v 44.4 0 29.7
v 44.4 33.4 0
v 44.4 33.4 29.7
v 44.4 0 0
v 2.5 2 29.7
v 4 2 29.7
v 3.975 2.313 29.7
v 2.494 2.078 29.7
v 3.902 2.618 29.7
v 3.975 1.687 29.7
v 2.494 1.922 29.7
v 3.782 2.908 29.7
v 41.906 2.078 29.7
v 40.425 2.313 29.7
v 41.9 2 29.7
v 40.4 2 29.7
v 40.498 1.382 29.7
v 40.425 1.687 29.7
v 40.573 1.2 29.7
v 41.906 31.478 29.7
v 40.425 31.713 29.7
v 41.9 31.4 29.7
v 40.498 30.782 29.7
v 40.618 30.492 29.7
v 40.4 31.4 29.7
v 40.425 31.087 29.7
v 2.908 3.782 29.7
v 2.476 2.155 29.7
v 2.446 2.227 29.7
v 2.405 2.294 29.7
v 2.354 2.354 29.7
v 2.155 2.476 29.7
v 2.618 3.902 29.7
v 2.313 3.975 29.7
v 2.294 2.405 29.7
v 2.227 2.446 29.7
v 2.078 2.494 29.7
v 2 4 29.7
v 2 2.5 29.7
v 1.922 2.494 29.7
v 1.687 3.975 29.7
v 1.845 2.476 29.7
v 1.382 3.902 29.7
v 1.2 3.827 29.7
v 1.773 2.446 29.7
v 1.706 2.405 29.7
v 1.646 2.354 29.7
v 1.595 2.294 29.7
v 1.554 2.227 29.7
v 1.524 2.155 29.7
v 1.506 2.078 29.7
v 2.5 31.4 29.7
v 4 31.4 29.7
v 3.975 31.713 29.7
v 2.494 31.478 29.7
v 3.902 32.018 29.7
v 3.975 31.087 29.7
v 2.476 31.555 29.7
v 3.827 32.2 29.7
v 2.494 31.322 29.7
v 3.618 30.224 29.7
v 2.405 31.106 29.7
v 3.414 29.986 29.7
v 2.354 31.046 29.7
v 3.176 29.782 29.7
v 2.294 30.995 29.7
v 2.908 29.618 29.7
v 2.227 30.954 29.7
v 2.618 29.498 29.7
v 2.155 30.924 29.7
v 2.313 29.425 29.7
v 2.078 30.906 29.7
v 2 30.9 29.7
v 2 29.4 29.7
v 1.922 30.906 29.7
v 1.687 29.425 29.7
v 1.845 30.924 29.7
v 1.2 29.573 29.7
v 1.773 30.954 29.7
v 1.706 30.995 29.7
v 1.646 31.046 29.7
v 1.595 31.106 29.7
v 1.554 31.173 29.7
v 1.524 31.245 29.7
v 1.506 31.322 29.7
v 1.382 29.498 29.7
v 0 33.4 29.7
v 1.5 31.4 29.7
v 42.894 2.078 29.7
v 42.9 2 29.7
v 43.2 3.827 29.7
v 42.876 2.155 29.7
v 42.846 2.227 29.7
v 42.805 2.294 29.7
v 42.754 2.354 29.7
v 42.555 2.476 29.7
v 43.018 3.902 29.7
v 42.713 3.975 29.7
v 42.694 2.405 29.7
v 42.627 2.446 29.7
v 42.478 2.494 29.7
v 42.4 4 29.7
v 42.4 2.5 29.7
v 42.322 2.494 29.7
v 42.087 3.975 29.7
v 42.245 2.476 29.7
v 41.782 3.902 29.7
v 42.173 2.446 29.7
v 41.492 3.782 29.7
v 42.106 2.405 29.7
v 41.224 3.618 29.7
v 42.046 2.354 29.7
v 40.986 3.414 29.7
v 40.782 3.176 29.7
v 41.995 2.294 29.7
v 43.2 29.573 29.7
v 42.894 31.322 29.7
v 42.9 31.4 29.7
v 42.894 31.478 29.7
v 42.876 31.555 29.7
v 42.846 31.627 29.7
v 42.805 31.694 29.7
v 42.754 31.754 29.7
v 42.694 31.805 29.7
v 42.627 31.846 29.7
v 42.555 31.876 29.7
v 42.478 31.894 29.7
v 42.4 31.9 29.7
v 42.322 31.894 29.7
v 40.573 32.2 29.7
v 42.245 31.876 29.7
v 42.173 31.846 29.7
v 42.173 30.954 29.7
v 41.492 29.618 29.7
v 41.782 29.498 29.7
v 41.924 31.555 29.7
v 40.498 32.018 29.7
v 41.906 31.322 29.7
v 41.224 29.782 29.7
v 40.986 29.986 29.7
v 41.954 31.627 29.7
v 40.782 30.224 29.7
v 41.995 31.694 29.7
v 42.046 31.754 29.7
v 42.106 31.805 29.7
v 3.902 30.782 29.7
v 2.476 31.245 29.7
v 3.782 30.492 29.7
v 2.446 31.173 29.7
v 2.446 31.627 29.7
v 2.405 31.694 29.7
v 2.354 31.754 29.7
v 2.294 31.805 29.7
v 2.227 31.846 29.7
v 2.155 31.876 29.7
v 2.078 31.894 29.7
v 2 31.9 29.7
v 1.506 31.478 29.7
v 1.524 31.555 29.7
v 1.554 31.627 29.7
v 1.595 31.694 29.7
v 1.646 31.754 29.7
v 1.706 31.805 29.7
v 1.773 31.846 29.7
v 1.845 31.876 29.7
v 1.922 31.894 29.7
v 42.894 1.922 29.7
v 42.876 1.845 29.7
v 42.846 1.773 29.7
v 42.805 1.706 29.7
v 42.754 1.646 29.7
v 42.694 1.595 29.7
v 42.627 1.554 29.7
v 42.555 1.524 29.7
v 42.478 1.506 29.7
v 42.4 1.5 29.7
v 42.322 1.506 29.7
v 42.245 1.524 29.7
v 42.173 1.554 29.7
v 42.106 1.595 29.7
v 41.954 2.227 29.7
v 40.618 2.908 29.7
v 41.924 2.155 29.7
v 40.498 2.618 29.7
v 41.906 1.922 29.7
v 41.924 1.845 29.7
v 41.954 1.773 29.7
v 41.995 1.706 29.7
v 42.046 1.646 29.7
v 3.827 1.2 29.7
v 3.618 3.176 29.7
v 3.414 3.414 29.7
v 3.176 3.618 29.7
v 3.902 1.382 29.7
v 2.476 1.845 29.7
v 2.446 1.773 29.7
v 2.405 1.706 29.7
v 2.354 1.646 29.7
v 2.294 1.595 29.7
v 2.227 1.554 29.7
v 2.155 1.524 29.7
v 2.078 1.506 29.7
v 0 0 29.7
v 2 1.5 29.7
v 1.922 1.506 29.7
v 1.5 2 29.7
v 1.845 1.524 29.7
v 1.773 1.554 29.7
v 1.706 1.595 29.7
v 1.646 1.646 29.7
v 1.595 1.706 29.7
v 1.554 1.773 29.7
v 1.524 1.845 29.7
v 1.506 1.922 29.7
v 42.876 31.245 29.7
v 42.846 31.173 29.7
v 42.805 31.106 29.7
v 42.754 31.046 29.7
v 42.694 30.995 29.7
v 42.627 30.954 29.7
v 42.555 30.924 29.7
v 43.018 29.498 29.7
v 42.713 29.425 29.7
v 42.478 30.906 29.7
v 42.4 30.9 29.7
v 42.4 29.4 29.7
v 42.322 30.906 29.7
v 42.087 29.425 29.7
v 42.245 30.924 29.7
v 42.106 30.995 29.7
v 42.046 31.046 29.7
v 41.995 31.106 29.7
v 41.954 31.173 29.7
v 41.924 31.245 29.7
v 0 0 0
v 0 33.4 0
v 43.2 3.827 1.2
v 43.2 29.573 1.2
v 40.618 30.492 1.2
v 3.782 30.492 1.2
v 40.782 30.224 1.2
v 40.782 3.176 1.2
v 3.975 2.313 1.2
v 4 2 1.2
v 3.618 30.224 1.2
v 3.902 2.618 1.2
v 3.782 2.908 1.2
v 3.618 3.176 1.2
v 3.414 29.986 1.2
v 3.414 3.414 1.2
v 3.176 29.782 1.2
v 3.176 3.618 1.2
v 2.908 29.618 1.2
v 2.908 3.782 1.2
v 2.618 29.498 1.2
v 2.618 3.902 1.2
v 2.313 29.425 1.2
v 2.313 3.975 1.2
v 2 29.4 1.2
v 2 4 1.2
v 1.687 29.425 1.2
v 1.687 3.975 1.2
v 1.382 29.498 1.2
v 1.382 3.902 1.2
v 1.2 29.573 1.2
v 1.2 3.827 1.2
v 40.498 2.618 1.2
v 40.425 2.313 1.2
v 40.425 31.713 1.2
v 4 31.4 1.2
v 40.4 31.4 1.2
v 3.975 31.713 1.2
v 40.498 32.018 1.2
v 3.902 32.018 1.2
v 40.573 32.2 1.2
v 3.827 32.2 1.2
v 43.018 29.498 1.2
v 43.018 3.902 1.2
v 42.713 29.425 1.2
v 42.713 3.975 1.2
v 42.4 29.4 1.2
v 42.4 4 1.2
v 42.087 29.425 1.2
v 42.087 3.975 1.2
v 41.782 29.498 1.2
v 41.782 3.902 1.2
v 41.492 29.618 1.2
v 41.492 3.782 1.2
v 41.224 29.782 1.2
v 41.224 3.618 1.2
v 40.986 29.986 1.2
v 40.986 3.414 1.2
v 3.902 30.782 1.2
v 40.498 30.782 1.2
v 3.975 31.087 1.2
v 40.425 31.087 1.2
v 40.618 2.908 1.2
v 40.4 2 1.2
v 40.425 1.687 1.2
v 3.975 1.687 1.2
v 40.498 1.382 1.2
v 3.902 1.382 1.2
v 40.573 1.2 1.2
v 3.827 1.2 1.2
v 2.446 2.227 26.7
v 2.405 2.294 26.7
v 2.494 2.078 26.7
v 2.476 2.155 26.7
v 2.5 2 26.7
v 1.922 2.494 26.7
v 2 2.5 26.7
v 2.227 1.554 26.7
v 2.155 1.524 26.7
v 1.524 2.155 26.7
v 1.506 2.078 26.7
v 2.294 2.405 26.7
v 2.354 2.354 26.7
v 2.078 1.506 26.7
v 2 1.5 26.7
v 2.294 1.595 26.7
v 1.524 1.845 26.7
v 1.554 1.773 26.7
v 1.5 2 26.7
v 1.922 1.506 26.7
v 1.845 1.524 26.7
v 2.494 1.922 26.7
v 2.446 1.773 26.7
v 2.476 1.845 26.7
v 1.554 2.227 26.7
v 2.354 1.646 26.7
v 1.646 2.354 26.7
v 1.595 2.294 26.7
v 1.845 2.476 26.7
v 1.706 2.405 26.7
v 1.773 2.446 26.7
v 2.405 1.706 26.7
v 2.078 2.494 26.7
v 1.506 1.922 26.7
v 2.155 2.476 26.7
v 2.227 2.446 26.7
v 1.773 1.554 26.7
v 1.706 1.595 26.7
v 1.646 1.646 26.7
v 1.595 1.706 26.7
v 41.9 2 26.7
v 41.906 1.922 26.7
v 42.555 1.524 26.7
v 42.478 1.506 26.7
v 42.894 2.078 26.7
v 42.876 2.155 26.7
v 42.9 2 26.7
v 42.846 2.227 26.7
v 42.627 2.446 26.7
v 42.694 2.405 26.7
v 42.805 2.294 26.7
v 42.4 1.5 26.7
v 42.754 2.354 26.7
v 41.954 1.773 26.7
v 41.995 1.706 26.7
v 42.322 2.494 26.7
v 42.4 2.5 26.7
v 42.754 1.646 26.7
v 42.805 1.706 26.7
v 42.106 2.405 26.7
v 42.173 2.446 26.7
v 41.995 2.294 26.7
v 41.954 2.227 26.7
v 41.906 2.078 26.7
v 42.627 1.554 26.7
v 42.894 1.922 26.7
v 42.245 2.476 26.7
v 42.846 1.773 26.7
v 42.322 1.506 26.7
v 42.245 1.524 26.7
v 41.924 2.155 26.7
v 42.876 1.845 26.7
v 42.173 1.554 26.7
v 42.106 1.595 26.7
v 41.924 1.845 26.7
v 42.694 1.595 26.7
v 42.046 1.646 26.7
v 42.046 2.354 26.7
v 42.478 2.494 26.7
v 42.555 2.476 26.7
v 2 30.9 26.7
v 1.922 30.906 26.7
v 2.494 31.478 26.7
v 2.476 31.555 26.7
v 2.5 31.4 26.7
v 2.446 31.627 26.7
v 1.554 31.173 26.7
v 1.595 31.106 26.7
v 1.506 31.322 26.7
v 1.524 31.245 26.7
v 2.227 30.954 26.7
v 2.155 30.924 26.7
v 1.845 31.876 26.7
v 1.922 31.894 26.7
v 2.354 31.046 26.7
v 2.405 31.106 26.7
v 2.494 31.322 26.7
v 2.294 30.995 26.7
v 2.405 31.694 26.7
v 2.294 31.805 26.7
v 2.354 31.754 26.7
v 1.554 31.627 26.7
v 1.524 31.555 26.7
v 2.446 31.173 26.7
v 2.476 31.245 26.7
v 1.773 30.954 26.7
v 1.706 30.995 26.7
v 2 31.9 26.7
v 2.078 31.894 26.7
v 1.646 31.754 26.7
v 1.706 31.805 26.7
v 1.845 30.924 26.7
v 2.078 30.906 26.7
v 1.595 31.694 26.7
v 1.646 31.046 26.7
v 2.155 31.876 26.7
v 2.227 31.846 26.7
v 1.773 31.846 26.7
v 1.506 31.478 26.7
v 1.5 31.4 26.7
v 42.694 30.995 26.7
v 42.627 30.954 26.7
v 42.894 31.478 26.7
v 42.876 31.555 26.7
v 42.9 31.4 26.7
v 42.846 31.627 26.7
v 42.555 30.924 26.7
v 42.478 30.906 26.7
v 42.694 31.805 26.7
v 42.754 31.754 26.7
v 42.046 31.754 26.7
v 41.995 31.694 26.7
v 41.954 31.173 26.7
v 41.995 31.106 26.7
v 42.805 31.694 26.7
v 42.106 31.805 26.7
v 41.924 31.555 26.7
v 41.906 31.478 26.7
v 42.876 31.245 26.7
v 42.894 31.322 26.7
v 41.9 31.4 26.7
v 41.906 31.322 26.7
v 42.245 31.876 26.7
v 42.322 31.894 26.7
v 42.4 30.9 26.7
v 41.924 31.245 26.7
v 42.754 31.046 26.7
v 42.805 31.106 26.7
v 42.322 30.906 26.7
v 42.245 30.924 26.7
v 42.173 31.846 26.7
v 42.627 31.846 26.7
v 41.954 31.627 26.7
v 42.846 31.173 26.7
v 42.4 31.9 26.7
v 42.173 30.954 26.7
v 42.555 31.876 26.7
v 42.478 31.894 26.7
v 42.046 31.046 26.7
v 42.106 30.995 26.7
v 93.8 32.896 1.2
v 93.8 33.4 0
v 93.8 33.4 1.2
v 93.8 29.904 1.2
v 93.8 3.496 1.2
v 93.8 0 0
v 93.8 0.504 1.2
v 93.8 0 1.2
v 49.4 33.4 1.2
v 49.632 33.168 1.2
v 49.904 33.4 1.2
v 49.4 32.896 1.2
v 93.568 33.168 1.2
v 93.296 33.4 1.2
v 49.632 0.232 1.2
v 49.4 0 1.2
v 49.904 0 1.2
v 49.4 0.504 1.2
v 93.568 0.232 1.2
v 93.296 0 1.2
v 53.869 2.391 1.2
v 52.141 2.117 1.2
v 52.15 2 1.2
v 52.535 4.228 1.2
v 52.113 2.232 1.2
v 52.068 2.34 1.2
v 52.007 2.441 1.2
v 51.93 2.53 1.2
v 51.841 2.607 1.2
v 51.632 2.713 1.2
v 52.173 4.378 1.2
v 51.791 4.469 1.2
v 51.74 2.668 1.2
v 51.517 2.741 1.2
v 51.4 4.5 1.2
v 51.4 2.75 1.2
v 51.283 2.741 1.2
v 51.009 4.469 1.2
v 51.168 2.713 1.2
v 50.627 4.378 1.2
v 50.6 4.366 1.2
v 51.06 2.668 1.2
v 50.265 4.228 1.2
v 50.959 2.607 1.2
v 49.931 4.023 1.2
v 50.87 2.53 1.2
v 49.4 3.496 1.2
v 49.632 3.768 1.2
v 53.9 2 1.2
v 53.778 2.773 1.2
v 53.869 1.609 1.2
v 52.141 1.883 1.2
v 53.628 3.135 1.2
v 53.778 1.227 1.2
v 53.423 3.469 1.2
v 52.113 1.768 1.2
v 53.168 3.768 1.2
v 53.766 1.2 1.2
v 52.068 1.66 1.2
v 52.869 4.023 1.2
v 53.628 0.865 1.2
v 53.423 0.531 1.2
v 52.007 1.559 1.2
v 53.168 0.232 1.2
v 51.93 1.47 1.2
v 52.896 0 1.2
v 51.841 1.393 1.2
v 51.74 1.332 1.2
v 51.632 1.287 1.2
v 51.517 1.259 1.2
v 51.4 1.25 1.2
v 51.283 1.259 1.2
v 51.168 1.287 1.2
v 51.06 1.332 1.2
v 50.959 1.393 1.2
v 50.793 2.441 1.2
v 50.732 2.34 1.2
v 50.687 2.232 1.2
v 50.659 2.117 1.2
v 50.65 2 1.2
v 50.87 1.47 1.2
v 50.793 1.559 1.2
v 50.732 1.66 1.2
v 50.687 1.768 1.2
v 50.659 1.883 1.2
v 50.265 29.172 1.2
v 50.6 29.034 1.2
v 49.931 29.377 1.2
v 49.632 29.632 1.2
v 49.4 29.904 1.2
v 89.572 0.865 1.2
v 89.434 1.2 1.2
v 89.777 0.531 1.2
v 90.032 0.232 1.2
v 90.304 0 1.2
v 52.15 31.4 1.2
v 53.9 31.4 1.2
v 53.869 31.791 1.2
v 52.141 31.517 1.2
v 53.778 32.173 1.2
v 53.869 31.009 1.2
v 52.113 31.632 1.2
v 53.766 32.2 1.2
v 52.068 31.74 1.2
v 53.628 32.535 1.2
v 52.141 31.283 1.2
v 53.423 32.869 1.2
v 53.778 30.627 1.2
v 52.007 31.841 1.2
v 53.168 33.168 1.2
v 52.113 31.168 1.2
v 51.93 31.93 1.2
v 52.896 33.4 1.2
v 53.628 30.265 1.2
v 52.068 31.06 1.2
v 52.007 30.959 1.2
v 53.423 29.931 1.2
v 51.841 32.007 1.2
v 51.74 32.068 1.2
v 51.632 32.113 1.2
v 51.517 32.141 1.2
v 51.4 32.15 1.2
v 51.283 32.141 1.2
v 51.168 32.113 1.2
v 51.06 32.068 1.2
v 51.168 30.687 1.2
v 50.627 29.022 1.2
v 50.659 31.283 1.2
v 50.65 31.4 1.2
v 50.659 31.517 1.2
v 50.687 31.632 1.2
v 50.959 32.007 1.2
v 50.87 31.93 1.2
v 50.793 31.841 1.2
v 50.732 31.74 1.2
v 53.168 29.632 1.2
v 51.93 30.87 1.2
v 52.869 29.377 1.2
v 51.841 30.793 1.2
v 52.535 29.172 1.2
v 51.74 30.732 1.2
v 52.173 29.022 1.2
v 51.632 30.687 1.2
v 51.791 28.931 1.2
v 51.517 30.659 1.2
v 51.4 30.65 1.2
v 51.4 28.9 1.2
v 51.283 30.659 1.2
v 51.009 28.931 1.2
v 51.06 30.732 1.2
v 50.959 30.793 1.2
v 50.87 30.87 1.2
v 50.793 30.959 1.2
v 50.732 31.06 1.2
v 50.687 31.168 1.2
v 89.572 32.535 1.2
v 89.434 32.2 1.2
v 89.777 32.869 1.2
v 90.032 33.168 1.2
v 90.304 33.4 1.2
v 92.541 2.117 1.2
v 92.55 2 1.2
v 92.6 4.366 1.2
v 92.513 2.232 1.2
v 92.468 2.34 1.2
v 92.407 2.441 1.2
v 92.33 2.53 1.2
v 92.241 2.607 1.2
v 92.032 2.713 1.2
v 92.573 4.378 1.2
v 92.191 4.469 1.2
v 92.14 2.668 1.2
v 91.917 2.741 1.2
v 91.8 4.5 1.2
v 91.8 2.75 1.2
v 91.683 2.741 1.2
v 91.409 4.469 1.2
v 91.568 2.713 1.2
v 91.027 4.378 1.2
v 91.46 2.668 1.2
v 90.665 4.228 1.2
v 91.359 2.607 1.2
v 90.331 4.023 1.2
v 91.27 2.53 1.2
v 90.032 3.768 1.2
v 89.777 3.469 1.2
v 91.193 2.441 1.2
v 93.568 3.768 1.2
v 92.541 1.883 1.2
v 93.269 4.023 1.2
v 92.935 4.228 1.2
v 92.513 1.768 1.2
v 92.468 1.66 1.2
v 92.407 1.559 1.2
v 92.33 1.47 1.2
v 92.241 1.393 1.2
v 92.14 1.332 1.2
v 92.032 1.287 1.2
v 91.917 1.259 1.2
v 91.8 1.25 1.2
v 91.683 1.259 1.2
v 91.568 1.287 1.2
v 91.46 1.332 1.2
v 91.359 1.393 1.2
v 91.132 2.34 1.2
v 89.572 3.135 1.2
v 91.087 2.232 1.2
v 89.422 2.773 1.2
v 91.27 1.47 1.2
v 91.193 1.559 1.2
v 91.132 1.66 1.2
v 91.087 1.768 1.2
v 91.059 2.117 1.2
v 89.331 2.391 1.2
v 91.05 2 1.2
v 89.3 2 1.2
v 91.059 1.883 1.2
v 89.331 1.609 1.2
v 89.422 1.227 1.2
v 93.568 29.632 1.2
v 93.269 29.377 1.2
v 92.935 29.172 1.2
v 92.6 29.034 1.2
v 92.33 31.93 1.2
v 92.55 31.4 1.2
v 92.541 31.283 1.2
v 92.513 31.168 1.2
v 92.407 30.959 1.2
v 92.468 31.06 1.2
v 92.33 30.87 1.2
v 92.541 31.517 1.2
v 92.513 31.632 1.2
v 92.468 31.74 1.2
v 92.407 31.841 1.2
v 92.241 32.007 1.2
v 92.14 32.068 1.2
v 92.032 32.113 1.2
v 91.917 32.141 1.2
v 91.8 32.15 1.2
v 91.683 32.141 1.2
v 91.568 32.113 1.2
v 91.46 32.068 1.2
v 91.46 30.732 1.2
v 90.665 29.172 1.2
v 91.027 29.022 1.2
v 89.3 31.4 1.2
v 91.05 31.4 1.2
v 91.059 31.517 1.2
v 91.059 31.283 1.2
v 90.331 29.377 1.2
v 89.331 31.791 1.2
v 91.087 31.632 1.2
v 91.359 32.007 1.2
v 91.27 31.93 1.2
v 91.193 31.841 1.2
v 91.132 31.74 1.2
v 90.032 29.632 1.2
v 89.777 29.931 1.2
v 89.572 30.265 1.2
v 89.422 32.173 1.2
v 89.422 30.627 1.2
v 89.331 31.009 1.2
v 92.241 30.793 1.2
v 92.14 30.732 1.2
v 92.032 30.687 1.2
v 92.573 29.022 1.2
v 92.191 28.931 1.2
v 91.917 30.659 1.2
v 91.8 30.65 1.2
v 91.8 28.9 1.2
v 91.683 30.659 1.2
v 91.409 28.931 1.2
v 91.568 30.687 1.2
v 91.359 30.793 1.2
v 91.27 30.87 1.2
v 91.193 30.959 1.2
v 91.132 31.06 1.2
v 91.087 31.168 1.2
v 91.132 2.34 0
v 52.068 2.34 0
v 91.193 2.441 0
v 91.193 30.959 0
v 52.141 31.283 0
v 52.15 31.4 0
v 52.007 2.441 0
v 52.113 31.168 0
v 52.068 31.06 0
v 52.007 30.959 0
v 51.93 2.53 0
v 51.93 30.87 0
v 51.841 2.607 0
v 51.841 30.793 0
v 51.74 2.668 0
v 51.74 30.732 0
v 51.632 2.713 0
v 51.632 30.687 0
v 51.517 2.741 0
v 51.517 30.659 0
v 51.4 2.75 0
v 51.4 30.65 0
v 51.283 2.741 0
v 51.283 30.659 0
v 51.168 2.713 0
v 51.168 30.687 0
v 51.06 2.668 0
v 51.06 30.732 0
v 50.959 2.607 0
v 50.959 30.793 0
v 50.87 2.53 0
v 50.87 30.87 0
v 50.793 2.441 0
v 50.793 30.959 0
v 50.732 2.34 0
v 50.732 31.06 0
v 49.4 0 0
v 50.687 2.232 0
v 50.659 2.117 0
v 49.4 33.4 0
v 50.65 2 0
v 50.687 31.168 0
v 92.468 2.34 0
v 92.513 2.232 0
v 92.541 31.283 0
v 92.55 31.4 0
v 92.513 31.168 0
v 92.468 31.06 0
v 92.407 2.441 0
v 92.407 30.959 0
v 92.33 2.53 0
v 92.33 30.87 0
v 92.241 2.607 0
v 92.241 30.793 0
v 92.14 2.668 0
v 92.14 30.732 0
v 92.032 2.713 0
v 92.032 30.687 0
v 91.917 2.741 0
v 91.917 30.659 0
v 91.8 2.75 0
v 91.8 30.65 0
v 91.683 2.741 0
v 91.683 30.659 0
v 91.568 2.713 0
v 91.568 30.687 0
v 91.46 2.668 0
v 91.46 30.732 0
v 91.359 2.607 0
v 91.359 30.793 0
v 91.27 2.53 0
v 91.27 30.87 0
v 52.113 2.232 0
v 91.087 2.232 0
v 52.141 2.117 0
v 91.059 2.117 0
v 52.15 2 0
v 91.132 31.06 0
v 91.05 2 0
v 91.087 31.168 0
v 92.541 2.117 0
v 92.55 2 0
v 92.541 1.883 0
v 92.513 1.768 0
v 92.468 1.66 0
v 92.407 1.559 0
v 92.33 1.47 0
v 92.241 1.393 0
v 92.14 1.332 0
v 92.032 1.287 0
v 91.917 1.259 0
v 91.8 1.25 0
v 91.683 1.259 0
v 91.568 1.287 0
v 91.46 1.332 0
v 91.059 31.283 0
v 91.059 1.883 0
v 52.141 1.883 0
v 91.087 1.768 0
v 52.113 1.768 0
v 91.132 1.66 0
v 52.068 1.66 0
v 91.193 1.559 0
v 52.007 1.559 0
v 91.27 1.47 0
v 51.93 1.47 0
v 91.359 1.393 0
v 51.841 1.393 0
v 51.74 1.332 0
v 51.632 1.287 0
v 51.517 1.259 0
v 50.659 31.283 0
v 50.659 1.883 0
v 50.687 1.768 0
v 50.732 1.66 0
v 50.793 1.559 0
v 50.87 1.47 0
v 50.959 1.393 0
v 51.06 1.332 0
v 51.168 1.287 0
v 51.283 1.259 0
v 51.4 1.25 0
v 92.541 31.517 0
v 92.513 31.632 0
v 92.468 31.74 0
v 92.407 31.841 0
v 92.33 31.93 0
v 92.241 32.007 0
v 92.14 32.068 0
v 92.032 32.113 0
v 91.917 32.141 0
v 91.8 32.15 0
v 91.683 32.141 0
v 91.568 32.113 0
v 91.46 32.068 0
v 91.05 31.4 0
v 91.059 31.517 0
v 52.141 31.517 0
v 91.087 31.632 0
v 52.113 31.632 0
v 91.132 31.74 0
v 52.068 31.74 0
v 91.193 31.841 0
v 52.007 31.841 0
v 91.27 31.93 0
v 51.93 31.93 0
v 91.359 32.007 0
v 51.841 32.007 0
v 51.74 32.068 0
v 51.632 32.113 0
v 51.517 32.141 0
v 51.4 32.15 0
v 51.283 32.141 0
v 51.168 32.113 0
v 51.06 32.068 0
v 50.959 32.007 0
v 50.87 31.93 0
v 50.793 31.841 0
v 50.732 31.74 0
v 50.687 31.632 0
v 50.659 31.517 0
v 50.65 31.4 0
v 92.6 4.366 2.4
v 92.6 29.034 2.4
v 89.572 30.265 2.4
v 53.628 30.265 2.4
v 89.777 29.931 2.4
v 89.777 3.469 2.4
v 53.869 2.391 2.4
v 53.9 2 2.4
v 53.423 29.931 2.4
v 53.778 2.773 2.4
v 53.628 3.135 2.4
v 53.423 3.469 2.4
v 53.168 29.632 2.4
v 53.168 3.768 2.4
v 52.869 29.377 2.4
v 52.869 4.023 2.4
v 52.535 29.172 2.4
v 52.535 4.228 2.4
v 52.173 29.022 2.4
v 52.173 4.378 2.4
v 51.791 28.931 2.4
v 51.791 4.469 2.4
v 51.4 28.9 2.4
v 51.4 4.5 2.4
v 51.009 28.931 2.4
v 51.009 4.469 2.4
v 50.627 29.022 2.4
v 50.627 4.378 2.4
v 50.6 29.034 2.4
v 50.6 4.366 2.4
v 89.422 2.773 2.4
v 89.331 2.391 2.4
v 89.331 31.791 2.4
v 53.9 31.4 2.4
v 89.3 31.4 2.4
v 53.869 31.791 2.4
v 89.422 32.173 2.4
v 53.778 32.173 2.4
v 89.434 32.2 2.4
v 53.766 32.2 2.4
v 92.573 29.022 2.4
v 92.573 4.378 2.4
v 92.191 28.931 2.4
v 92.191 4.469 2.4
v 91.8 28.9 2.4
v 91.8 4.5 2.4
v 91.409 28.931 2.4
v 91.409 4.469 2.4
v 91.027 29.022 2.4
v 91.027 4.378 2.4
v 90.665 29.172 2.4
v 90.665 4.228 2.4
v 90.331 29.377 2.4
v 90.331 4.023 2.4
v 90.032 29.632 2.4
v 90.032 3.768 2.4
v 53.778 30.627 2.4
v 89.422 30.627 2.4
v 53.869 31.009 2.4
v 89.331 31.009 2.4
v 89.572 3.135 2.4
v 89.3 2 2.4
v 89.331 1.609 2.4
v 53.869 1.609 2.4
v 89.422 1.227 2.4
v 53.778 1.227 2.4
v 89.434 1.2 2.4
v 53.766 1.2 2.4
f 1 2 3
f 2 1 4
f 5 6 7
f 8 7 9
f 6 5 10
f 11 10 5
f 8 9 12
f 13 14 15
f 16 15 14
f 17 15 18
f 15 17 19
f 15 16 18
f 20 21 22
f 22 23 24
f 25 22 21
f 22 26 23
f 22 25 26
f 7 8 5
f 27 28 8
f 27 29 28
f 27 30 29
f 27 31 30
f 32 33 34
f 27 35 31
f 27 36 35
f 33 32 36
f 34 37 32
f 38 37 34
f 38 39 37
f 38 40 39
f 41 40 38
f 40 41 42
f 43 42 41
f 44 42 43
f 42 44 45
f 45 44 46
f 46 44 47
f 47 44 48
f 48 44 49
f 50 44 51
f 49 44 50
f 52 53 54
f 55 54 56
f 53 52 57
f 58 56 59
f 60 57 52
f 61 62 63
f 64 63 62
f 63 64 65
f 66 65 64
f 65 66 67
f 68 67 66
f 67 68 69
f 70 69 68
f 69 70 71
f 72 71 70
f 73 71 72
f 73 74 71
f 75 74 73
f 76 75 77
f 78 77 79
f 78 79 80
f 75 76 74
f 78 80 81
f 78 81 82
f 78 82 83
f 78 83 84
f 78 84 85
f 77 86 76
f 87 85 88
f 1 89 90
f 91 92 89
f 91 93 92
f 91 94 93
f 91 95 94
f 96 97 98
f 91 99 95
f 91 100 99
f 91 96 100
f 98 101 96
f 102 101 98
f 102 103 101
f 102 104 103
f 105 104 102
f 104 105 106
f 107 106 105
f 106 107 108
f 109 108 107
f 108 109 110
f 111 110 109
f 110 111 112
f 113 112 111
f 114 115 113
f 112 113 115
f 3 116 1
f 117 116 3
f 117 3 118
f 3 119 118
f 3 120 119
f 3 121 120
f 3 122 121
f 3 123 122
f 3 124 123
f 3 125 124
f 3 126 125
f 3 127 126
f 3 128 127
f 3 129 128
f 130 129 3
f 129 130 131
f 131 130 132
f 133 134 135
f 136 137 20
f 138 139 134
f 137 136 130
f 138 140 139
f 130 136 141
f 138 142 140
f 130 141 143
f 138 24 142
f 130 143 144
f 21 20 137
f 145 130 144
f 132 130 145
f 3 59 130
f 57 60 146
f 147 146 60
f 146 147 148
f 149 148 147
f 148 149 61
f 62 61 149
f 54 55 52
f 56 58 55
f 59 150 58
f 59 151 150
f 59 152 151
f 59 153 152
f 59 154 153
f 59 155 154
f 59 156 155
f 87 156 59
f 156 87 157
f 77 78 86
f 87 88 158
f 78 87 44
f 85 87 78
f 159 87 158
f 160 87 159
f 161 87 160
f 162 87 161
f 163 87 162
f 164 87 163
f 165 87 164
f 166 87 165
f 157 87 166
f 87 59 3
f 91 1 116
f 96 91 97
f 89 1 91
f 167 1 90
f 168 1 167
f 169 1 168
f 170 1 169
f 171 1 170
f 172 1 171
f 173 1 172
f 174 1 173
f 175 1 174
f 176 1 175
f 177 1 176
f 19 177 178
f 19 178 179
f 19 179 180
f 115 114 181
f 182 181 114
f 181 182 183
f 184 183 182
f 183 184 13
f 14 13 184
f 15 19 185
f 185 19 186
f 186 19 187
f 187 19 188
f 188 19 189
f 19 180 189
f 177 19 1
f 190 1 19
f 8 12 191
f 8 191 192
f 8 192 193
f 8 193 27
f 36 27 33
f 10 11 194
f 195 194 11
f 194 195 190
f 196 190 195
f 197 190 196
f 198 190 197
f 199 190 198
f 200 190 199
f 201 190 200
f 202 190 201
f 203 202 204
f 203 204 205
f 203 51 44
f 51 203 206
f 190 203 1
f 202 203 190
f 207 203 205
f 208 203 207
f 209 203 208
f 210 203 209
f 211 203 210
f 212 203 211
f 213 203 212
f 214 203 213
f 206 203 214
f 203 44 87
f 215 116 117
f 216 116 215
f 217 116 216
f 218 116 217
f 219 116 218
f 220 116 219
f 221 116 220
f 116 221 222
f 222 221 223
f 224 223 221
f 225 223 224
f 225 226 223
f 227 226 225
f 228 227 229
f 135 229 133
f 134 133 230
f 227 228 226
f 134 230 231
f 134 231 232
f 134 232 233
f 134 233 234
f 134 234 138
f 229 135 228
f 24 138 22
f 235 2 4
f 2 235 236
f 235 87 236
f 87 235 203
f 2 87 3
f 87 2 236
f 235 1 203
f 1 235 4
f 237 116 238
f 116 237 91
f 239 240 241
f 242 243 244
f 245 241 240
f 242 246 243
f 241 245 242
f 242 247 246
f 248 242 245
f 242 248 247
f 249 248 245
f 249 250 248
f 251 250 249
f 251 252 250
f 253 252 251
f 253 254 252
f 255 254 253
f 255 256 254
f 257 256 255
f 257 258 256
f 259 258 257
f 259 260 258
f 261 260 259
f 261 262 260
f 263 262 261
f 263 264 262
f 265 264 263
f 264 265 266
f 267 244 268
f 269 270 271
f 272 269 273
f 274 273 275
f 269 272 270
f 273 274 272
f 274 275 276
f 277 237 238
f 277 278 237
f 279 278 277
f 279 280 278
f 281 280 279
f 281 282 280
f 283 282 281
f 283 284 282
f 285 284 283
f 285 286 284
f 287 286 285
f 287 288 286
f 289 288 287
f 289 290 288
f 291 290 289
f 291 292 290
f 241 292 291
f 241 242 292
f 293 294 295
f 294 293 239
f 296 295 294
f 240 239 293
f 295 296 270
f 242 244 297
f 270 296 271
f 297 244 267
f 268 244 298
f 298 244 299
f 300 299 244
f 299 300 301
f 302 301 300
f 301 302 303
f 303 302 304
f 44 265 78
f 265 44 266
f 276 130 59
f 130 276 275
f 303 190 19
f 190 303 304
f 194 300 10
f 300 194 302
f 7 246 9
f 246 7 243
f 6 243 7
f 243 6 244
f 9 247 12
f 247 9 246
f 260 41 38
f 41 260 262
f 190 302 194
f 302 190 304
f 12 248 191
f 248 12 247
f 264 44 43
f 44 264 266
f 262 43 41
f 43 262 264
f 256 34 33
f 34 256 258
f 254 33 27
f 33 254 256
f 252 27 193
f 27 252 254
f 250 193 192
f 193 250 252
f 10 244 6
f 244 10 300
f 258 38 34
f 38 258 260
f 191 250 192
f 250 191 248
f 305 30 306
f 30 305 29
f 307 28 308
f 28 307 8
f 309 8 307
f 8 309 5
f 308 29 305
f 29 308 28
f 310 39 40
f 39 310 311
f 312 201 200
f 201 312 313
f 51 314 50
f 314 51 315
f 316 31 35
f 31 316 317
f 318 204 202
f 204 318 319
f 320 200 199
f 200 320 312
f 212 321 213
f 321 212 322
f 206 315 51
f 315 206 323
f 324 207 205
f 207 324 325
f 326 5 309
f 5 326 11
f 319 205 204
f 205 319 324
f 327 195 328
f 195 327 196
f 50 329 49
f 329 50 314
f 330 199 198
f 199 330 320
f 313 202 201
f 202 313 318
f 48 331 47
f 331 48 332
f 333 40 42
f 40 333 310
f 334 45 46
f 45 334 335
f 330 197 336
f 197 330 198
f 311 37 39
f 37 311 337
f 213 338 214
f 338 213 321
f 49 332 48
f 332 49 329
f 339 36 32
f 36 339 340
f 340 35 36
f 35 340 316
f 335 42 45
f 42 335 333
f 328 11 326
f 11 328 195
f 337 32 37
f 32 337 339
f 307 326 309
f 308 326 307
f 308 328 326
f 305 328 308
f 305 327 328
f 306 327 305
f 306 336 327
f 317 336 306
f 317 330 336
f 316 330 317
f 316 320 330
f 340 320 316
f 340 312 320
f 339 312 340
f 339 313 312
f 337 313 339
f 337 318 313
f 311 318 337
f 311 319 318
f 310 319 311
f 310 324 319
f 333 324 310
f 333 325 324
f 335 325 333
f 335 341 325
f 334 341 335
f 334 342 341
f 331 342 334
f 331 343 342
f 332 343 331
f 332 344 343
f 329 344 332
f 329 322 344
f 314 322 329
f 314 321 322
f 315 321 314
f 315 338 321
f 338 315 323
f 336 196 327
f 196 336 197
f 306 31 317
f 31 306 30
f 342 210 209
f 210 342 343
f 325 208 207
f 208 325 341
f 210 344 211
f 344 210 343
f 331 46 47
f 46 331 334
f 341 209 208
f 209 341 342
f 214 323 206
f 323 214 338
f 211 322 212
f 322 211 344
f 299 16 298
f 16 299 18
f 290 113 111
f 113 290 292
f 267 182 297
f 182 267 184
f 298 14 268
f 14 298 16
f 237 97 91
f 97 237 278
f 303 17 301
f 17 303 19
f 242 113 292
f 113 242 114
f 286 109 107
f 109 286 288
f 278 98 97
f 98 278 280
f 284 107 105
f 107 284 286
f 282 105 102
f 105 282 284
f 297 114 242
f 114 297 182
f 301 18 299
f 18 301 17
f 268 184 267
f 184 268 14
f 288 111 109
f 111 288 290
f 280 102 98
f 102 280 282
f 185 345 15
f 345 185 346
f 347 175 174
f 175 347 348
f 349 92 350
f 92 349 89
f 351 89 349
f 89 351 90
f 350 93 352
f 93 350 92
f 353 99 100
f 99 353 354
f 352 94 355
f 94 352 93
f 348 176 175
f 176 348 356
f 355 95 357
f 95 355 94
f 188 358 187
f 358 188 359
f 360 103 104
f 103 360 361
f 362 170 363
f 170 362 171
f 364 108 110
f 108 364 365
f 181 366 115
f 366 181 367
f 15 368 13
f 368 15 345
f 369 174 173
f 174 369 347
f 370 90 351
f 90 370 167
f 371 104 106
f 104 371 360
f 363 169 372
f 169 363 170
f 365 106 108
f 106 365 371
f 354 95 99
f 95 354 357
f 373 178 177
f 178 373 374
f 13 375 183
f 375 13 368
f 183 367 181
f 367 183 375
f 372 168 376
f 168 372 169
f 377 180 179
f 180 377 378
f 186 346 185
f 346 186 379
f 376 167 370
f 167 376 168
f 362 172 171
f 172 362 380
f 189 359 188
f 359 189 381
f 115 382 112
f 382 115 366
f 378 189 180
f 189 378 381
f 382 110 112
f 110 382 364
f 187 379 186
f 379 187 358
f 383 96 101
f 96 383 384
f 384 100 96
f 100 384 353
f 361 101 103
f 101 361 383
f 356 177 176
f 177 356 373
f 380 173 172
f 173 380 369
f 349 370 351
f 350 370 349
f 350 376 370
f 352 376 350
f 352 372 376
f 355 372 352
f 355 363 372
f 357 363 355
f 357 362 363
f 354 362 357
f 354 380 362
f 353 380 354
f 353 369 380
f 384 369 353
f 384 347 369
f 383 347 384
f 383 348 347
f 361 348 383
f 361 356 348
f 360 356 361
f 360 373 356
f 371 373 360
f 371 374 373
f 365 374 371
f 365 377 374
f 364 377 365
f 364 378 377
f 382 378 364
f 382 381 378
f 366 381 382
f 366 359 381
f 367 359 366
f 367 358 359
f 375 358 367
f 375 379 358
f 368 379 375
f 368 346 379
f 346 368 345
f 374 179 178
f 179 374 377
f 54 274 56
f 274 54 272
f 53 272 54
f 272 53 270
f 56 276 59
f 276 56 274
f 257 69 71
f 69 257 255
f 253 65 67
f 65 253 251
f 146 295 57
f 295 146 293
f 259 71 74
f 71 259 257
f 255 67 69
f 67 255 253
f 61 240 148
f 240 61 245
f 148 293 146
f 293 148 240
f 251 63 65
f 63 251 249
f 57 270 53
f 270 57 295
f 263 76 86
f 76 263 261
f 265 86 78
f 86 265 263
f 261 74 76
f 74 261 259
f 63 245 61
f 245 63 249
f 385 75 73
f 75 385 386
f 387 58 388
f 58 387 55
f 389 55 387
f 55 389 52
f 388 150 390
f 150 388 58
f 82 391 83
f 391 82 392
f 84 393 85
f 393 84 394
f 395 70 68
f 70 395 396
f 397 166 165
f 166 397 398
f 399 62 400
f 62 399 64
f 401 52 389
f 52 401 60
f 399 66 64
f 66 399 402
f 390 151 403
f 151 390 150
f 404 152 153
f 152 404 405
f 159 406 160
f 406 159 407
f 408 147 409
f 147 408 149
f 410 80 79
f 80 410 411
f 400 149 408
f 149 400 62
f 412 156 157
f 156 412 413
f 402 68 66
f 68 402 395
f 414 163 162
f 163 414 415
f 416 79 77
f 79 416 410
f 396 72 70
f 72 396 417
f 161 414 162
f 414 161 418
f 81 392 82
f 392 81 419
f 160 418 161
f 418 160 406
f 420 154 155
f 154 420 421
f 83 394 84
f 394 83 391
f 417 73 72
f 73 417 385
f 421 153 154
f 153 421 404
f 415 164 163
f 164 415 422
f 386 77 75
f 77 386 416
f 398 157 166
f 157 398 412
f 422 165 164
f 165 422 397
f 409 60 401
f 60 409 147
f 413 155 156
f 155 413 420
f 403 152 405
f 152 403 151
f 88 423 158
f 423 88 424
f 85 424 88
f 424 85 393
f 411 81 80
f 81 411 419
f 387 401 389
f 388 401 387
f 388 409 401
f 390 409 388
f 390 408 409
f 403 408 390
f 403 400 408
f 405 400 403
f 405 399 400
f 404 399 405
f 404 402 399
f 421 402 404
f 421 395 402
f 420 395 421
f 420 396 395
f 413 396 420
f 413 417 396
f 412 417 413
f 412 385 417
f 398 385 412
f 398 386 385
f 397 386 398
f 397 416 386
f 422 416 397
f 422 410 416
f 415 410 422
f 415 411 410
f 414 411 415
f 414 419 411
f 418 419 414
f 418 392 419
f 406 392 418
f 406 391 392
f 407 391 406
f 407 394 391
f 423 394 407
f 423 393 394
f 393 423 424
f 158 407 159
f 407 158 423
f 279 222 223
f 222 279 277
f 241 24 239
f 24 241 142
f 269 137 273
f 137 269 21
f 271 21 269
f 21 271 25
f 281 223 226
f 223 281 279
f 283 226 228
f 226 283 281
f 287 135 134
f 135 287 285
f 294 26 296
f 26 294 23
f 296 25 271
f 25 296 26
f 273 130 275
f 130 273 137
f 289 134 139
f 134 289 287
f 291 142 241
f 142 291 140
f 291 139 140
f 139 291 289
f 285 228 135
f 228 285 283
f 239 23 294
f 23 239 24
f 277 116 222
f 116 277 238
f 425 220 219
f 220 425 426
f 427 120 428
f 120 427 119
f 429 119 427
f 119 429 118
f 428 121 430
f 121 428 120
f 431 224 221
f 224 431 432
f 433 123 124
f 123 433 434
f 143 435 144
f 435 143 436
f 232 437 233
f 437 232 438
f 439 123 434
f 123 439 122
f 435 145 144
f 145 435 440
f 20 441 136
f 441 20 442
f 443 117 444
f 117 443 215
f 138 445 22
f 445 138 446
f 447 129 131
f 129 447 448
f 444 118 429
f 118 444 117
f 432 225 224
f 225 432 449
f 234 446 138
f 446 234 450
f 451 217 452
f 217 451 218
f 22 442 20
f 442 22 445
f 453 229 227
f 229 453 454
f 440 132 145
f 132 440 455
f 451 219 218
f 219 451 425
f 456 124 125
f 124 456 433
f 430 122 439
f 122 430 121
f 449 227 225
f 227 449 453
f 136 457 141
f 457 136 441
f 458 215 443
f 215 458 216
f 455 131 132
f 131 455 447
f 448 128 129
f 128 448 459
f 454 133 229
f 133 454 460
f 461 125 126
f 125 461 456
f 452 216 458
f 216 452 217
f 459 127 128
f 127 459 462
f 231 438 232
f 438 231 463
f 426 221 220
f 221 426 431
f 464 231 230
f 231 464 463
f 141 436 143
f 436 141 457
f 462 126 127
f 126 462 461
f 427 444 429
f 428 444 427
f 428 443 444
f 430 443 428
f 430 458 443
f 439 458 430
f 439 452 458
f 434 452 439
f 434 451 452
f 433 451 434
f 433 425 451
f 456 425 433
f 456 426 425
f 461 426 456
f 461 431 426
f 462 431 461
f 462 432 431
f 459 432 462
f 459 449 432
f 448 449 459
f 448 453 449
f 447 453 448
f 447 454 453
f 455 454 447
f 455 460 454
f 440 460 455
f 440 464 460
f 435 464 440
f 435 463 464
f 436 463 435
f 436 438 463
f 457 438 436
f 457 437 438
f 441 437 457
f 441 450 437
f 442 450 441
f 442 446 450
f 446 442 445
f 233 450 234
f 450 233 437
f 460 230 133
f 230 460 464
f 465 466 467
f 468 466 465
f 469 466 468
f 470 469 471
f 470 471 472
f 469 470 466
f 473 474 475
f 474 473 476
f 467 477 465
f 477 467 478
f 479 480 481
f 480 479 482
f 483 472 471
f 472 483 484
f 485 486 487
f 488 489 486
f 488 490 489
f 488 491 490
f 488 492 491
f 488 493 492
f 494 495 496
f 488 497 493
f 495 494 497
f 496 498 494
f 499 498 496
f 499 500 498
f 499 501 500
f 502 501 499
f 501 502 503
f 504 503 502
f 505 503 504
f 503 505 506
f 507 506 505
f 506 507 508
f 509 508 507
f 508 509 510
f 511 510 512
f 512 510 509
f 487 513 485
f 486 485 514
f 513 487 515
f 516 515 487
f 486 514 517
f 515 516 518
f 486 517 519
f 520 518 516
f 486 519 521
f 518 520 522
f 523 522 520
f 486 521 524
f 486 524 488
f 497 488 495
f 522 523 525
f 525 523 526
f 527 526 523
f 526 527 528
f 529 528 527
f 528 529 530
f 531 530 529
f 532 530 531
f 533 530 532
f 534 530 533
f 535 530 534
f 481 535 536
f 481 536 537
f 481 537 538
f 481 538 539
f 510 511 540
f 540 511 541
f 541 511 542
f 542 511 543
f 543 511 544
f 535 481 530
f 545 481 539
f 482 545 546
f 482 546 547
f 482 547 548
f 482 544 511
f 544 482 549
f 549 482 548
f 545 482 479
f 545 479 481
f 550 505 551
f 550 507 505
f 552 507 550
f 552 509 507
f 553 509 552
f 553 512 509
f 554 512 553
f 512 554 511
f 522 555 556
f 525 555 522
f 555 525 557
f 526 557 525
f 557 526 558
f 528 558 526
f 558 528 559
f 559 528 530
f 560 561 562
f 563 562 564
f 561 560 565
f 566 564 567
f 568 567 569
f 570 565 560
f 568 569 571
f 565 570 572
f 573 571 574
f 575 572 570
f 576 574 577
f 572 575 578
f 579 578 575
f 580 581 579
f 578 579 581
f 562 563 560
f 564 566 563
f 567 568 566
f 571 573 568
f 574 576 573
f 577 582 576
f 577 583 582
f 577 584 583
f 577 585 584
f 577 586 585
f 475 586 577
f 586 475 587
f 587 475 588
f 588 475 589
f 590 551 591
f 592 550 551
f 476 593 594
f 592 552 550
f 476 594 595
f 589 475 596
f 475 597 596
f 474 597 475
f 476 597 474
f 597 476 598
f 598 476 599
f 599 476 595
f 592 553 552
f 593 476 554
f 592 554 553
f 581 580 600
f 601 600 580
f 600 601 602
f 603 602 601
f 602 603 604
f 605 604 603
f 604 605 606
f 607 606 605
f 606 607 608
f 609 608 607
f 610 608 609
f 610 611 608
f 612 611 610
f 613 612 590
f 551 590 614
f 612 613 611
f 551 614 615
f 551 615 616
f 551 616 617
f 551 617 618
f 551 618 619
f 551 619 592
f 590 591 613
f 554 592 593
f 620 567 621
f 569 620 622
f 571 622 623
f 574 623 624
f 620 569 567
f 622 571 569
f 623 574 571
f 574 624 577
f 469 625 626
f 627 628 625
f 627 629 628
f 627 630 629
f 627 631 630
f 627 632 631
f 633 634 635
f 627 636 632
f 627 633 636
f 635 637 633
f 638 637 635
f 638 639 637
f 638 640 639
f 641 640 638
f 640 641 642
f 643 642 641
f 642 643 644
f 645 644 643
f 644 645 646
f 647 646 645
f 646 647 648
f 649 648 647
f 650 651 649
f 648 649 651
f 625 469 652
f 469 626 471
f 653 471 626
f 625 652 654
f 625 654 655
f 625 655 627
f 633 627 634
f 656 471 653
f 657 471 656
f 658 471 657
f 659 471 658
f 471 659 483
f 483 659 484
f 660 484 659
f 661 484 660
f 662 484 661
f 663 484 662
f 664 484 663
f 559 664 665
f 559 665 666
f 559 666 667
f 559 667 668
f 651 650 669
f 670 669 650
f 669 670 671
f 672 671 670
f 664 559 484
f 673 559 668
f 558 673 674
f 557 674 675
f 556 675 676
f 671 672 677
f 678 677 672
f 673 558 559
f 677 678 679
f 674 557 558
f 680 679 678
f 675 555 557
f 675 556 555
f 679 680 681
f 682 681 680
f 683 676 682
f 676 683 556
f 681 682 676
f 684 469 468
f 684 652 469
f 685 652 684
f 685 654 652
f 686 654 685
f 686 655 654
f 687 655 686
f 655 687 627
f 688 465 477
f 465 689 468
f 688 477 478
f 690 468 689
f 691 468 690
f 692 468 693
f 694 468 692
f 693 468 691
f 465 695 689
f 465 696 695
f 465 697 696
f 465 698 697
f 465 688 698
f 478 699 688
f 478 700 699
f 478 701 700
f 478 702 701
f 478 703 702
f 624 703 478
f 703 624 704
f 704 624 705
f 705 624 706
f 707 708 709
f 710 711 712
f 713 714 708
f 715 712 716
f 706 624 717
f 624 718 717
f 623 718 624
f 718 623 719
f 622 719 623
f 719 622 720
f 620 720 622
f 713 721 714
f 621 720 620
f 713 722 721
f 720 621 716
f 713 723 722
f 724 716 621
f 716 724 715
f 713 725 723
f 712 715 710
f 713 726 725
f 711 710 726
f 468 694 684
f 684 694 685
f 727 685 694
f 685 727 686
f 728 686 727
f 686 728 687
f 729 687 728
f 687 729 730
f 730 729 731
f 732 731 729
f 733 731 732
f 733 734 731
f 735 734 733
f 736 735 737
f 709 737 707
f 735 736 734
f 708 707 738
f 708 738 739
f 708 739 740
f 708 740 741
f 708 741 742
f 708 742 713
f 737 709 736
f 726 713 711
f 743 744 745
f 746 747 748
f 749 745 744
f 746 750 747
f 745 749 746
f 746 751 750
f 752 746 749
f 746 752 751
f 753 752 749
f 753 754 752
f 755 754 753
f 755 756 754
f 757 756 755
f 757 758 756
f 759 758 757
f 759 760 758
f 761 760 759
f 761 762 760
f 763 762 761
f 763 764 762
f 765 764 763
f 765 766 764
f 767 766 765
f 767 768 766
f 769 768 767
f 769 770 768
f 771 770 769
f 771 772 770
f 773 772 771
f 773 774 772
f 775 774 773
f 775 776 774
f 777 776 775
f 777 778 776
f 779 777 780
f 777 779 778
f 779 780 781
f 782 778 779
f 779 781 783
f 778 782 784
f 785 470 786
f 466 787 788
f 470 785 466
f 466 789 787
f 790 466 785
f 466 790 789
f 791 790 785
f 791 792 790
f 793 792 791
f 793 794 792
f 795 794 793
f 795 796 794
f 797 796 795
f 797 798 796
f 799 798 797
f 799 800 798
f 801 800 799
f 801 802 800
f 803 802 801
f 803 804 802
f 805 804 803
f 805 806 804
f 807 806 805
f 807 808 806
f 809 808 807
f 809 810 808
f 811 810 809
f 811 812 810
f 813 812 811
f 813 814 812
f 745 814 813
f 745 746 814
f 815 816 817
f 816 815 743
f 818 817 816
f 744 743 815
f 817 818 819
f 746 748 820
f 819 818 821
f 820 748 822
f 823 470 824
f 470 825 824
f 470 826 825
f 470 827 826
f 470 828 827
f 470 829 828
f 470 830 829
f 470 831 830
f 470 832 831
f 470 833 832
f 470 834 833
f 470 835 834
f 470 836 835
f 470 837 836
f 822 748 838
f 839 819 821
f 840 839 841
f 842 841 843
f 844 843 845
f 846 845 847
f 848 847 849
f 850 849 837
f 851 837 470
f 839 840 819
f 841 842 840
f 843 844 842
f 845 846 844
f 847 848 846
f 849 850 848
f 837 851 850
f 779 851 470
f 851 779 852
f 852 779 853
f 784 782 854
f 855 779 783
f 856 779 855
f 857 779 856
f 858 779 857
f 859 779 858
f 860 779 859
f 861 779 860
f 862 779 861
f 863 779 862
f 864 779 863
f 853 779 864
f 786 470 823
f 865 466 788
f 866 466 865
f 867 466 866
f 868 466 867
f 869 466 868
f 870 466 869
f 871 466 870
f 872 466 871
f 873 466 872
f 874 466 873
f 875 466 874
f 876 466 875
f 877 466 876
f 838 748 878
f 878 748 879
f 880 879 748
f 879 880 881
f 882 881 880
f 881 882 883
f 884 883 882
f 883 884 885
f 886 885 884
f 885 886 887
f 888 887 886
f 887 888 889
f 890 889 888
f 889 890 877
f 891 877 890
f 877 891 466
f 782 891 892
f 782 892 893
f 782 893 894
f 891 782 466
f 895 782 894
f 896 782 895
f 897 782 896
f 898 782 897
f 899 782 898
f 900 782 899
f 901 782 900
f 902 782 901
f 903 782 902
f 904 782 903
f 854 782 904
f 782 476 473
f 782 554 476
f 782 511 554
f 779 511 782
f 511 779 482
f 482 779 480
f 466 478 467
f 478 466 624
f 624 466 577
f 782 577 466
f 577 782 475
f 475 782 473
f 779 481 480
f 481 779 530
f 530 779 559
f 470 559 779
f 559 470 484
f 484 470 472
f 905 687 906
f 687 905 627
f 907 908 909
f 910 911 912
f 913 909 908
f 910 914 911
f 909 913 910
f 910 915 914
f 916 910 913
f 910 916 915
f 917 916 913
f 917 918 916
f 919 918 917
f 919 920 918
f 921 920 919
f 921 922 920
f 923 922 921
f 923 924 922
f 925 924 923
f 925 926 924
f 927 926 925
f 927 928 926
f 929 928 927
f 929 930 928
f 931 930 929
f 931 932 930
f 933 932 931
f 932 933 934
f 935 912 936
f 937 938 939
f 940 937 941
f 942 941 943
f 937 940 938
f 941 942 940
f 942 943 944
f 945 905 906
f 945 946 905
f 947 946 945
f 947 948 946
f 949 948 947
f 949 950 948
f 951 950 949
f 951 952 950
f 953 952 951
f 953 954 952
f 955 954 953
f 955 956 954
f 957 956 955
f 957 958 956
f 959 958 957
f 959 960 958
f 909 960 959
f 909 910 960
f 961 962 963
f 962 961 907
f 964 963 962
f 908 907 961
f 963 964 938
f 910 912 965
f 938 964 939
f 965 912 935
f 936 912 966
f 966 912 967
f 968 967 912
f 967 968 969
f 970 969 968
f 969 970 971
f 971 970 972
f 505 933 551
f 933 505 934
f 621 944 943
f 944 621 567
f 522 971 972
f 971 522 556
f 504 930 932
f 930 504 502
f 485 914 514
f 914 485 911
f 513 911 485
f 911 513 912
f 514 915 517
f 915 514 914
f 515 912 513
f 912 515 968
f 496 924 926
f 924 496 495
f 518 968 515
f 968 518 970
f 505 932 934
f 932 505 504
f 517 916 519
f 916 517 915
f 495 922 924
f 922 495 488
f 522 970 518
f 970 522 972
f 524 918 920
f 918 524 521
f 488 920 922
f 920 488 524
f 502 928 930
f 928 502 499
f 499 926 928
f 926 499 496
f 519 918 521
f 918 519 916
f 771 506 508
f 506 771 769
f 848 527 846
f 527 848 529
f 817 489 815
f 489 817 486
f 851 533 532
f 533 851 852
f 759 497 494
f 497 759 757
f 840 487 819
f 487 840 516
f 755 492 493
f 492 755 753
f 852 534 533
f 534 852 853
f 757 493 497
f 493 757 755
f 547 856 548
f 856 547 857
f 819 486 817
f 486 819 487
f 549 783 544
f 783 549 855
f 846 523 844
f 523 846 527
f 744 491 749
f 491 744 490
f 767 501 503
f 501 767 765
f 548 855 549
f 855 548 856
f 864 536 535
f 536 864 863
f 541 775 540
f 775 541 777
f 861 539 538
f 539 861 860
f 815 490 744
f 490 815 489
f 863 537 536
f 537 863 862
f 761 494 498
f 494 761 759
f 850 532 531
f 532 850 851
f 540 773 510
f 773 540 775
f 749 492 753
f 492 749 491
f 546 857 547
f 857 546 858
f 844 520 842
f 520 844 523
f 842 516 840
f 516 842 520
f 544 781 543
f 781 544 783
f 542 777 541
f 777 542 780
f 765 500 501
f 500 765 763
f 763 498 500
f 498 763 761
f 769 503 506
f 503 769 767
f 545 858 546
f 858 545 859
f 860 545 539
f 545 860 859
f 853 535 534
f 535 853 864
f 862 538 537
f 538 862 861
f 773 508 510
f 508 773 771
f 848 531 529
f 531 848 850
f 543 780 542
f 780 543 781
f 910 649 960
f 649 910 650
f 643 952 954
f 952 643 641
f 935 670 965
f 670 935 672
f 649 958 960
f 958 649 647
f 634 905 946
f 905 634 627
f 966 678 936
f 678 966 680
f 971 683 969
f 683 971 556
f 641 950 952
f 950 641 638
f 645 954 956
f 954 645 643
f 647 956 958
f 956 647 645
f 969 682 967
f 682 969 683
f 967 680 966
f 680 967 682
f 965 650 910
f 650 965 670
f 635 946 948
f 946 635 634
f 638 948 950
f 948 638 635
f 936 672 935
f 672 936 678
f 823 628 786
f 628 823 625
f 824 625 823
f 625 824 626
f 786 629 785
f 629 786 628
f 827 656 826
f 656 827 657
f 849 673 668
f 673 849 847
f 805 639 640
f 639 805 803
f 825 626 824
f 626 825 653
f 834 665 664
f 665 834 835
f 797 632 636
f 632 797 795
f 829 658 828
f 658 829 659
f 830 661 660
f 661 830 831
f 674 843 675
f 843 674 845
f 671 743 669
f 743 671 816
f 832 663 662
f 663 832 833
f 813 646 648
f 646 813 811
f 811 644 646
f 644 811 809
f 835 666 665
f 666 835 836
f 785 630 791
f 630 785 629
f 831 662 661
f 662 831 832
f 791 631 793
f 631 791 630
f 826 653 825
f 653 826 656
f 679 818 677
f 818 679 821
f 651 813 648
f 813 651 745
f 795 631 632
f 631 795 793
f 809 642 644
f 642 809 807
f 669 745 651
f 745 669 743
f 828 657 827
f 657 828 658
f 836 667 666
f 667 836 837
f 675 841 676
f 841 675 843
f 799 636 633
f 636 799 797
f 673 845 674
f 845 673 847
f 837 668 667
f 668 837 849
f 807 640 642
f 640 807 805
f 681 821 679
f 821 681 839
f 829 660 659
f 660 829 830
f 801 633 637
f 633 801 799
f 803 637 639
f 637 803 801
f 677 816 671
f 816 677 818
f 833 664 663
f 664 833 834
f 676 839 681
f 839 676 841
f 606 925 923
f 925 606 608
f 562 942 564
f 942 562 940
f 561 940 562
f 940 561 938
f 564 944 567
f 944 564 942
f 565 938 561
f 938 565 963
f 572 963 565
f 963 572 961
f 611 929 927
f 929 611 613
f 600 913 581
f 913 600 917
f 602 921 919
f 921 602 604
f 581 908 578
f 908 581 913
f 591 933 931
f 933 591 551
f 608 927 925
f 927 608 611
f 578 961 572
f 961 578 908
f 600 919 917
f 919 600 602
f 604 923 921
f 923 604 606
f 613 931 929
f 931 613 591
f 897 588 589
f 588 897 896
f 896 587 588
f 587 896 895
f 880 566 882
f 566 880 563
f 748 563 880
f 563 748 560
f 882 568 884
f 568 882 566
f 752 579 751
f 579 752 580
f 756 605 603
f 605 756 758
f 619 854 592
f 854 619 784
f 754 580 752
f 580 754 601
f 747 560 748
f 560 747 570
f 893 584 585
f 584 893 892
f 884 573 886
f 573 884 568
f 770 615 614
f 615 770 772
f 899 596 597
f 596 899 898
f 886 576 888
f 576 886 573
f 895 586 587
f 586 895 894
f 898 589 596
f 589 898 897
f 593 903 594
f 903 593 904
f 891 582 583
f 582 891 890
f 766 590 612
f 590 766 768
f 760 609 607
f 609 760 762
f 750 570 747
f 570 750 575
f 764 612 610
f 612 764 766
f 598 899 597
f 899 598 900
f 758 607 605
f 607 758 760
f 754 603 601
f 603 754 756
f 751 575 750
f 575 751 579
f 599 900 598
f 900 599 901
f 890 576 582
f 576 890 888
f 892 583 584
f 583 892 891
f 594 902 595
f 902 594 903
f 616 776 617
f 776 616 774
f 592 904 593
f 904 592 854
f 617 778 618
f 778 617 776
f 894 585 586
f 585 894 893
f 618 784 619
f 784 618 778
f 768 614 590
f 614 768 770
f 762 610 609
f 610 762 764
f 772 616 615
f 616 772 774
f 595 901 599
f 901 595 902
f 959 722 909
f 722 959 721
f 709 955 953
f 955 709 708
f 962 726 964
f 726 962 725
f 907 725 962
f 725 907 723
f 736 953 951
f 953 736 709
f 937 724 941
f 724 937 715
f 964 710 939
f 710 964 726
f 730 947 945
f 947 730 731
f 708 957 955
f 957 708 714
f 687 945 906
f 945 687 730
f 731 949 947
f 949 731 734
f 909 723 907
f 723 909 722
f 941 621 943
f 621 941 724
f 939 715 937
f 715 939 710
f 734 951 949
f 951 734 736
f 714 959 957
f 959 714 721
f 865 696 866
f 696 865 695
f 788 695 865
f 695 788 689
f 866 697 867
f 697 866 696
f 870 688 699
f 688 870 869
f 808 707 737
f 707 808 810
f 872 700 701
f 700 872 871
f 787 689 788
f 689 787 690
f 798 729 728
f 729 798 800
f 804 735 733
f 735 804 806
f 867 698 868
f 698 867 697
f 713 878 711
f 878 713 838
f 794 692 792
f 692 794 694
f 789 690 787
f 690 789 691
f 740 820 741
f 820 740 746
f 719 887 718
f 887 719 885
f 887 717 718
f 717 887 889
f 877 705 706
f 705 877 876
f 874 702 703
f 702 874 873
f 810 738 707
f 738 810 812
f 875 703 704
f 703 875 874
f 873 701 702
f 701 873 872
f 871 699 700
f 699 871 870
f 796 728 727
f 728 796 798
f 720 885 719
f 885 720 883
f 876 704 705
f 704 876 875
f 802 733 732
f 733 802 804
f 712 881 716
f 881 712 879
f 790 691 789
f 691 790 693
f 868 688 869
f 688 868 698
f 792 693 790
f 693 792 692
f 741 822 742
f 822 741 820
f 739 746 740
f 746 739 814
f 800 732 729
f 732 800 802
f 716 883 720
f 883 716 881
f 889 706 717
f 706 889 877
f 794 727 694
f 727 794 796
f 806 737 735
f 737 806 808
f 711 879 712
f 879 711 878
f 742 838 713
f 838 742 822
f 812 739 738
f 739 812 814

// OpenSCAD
platz=2.5;
laenge=37+2*platz;
breite=26+2*platz;
hoehe=26+platz;
wand=1.2;
radius=2;

module ecke(x,y)
{
    difference()
    {
        translate([x,y,wand])
            cylinder(h=hoehe,r1=radius,r2=radius,$fn=40);
        translate([x,y,hoehe+wand-3])
            cylinder(h=3,r1=0.5,r2=0.5,$fn=40);
    }
}

module eckausschnitt(x,y)
{
    union()
    {
        translate([x,y,wand])
            cylinder(h=wand,r1=radius+0.5,r2=radius+0.5,$fn=40);
        translate([x,y,0])
            cylinder(h=2*wand,r1=0.75,r2=0.75,$fn=40);
    }
}

difference()
{
    cube(size=[laenge+2*wand,breite+2*wand,hoehe+wand]);
    translate([wand,wand,wand]) cube(size=[laenge,breite,hoehe+1]);
}

//Ecken
ecke(radius,radius);
ecke(laenge+2*wand-radius,radius);
ecke(radius,breite+2*wand-radius);
ecke(laenge+2*wand-radius,breite+2*wand-radius);

//Deckel
abstand=laenge+2*wand+5;
difference()
{
    union()
    {
        translate([abstand,0,0])
            cube(size=[laenge+2*wand,breite+2*wand,wand]);
        translate([abstand+wand,wand,wand])
            cube(size=[laenge,breite,wand]);
    }
    union()
    {
        eckausschnitt(abstand+radius,radius);
        eckausschnitt(abstand+laenge+2*wand-radius,radius);
        eckausschnitt(abstand+radius,breite+2*wand-radius);
        eckausschnitt(abstand+laenge+2*wand-radius,breite+2*wand-radius);
    }
}
